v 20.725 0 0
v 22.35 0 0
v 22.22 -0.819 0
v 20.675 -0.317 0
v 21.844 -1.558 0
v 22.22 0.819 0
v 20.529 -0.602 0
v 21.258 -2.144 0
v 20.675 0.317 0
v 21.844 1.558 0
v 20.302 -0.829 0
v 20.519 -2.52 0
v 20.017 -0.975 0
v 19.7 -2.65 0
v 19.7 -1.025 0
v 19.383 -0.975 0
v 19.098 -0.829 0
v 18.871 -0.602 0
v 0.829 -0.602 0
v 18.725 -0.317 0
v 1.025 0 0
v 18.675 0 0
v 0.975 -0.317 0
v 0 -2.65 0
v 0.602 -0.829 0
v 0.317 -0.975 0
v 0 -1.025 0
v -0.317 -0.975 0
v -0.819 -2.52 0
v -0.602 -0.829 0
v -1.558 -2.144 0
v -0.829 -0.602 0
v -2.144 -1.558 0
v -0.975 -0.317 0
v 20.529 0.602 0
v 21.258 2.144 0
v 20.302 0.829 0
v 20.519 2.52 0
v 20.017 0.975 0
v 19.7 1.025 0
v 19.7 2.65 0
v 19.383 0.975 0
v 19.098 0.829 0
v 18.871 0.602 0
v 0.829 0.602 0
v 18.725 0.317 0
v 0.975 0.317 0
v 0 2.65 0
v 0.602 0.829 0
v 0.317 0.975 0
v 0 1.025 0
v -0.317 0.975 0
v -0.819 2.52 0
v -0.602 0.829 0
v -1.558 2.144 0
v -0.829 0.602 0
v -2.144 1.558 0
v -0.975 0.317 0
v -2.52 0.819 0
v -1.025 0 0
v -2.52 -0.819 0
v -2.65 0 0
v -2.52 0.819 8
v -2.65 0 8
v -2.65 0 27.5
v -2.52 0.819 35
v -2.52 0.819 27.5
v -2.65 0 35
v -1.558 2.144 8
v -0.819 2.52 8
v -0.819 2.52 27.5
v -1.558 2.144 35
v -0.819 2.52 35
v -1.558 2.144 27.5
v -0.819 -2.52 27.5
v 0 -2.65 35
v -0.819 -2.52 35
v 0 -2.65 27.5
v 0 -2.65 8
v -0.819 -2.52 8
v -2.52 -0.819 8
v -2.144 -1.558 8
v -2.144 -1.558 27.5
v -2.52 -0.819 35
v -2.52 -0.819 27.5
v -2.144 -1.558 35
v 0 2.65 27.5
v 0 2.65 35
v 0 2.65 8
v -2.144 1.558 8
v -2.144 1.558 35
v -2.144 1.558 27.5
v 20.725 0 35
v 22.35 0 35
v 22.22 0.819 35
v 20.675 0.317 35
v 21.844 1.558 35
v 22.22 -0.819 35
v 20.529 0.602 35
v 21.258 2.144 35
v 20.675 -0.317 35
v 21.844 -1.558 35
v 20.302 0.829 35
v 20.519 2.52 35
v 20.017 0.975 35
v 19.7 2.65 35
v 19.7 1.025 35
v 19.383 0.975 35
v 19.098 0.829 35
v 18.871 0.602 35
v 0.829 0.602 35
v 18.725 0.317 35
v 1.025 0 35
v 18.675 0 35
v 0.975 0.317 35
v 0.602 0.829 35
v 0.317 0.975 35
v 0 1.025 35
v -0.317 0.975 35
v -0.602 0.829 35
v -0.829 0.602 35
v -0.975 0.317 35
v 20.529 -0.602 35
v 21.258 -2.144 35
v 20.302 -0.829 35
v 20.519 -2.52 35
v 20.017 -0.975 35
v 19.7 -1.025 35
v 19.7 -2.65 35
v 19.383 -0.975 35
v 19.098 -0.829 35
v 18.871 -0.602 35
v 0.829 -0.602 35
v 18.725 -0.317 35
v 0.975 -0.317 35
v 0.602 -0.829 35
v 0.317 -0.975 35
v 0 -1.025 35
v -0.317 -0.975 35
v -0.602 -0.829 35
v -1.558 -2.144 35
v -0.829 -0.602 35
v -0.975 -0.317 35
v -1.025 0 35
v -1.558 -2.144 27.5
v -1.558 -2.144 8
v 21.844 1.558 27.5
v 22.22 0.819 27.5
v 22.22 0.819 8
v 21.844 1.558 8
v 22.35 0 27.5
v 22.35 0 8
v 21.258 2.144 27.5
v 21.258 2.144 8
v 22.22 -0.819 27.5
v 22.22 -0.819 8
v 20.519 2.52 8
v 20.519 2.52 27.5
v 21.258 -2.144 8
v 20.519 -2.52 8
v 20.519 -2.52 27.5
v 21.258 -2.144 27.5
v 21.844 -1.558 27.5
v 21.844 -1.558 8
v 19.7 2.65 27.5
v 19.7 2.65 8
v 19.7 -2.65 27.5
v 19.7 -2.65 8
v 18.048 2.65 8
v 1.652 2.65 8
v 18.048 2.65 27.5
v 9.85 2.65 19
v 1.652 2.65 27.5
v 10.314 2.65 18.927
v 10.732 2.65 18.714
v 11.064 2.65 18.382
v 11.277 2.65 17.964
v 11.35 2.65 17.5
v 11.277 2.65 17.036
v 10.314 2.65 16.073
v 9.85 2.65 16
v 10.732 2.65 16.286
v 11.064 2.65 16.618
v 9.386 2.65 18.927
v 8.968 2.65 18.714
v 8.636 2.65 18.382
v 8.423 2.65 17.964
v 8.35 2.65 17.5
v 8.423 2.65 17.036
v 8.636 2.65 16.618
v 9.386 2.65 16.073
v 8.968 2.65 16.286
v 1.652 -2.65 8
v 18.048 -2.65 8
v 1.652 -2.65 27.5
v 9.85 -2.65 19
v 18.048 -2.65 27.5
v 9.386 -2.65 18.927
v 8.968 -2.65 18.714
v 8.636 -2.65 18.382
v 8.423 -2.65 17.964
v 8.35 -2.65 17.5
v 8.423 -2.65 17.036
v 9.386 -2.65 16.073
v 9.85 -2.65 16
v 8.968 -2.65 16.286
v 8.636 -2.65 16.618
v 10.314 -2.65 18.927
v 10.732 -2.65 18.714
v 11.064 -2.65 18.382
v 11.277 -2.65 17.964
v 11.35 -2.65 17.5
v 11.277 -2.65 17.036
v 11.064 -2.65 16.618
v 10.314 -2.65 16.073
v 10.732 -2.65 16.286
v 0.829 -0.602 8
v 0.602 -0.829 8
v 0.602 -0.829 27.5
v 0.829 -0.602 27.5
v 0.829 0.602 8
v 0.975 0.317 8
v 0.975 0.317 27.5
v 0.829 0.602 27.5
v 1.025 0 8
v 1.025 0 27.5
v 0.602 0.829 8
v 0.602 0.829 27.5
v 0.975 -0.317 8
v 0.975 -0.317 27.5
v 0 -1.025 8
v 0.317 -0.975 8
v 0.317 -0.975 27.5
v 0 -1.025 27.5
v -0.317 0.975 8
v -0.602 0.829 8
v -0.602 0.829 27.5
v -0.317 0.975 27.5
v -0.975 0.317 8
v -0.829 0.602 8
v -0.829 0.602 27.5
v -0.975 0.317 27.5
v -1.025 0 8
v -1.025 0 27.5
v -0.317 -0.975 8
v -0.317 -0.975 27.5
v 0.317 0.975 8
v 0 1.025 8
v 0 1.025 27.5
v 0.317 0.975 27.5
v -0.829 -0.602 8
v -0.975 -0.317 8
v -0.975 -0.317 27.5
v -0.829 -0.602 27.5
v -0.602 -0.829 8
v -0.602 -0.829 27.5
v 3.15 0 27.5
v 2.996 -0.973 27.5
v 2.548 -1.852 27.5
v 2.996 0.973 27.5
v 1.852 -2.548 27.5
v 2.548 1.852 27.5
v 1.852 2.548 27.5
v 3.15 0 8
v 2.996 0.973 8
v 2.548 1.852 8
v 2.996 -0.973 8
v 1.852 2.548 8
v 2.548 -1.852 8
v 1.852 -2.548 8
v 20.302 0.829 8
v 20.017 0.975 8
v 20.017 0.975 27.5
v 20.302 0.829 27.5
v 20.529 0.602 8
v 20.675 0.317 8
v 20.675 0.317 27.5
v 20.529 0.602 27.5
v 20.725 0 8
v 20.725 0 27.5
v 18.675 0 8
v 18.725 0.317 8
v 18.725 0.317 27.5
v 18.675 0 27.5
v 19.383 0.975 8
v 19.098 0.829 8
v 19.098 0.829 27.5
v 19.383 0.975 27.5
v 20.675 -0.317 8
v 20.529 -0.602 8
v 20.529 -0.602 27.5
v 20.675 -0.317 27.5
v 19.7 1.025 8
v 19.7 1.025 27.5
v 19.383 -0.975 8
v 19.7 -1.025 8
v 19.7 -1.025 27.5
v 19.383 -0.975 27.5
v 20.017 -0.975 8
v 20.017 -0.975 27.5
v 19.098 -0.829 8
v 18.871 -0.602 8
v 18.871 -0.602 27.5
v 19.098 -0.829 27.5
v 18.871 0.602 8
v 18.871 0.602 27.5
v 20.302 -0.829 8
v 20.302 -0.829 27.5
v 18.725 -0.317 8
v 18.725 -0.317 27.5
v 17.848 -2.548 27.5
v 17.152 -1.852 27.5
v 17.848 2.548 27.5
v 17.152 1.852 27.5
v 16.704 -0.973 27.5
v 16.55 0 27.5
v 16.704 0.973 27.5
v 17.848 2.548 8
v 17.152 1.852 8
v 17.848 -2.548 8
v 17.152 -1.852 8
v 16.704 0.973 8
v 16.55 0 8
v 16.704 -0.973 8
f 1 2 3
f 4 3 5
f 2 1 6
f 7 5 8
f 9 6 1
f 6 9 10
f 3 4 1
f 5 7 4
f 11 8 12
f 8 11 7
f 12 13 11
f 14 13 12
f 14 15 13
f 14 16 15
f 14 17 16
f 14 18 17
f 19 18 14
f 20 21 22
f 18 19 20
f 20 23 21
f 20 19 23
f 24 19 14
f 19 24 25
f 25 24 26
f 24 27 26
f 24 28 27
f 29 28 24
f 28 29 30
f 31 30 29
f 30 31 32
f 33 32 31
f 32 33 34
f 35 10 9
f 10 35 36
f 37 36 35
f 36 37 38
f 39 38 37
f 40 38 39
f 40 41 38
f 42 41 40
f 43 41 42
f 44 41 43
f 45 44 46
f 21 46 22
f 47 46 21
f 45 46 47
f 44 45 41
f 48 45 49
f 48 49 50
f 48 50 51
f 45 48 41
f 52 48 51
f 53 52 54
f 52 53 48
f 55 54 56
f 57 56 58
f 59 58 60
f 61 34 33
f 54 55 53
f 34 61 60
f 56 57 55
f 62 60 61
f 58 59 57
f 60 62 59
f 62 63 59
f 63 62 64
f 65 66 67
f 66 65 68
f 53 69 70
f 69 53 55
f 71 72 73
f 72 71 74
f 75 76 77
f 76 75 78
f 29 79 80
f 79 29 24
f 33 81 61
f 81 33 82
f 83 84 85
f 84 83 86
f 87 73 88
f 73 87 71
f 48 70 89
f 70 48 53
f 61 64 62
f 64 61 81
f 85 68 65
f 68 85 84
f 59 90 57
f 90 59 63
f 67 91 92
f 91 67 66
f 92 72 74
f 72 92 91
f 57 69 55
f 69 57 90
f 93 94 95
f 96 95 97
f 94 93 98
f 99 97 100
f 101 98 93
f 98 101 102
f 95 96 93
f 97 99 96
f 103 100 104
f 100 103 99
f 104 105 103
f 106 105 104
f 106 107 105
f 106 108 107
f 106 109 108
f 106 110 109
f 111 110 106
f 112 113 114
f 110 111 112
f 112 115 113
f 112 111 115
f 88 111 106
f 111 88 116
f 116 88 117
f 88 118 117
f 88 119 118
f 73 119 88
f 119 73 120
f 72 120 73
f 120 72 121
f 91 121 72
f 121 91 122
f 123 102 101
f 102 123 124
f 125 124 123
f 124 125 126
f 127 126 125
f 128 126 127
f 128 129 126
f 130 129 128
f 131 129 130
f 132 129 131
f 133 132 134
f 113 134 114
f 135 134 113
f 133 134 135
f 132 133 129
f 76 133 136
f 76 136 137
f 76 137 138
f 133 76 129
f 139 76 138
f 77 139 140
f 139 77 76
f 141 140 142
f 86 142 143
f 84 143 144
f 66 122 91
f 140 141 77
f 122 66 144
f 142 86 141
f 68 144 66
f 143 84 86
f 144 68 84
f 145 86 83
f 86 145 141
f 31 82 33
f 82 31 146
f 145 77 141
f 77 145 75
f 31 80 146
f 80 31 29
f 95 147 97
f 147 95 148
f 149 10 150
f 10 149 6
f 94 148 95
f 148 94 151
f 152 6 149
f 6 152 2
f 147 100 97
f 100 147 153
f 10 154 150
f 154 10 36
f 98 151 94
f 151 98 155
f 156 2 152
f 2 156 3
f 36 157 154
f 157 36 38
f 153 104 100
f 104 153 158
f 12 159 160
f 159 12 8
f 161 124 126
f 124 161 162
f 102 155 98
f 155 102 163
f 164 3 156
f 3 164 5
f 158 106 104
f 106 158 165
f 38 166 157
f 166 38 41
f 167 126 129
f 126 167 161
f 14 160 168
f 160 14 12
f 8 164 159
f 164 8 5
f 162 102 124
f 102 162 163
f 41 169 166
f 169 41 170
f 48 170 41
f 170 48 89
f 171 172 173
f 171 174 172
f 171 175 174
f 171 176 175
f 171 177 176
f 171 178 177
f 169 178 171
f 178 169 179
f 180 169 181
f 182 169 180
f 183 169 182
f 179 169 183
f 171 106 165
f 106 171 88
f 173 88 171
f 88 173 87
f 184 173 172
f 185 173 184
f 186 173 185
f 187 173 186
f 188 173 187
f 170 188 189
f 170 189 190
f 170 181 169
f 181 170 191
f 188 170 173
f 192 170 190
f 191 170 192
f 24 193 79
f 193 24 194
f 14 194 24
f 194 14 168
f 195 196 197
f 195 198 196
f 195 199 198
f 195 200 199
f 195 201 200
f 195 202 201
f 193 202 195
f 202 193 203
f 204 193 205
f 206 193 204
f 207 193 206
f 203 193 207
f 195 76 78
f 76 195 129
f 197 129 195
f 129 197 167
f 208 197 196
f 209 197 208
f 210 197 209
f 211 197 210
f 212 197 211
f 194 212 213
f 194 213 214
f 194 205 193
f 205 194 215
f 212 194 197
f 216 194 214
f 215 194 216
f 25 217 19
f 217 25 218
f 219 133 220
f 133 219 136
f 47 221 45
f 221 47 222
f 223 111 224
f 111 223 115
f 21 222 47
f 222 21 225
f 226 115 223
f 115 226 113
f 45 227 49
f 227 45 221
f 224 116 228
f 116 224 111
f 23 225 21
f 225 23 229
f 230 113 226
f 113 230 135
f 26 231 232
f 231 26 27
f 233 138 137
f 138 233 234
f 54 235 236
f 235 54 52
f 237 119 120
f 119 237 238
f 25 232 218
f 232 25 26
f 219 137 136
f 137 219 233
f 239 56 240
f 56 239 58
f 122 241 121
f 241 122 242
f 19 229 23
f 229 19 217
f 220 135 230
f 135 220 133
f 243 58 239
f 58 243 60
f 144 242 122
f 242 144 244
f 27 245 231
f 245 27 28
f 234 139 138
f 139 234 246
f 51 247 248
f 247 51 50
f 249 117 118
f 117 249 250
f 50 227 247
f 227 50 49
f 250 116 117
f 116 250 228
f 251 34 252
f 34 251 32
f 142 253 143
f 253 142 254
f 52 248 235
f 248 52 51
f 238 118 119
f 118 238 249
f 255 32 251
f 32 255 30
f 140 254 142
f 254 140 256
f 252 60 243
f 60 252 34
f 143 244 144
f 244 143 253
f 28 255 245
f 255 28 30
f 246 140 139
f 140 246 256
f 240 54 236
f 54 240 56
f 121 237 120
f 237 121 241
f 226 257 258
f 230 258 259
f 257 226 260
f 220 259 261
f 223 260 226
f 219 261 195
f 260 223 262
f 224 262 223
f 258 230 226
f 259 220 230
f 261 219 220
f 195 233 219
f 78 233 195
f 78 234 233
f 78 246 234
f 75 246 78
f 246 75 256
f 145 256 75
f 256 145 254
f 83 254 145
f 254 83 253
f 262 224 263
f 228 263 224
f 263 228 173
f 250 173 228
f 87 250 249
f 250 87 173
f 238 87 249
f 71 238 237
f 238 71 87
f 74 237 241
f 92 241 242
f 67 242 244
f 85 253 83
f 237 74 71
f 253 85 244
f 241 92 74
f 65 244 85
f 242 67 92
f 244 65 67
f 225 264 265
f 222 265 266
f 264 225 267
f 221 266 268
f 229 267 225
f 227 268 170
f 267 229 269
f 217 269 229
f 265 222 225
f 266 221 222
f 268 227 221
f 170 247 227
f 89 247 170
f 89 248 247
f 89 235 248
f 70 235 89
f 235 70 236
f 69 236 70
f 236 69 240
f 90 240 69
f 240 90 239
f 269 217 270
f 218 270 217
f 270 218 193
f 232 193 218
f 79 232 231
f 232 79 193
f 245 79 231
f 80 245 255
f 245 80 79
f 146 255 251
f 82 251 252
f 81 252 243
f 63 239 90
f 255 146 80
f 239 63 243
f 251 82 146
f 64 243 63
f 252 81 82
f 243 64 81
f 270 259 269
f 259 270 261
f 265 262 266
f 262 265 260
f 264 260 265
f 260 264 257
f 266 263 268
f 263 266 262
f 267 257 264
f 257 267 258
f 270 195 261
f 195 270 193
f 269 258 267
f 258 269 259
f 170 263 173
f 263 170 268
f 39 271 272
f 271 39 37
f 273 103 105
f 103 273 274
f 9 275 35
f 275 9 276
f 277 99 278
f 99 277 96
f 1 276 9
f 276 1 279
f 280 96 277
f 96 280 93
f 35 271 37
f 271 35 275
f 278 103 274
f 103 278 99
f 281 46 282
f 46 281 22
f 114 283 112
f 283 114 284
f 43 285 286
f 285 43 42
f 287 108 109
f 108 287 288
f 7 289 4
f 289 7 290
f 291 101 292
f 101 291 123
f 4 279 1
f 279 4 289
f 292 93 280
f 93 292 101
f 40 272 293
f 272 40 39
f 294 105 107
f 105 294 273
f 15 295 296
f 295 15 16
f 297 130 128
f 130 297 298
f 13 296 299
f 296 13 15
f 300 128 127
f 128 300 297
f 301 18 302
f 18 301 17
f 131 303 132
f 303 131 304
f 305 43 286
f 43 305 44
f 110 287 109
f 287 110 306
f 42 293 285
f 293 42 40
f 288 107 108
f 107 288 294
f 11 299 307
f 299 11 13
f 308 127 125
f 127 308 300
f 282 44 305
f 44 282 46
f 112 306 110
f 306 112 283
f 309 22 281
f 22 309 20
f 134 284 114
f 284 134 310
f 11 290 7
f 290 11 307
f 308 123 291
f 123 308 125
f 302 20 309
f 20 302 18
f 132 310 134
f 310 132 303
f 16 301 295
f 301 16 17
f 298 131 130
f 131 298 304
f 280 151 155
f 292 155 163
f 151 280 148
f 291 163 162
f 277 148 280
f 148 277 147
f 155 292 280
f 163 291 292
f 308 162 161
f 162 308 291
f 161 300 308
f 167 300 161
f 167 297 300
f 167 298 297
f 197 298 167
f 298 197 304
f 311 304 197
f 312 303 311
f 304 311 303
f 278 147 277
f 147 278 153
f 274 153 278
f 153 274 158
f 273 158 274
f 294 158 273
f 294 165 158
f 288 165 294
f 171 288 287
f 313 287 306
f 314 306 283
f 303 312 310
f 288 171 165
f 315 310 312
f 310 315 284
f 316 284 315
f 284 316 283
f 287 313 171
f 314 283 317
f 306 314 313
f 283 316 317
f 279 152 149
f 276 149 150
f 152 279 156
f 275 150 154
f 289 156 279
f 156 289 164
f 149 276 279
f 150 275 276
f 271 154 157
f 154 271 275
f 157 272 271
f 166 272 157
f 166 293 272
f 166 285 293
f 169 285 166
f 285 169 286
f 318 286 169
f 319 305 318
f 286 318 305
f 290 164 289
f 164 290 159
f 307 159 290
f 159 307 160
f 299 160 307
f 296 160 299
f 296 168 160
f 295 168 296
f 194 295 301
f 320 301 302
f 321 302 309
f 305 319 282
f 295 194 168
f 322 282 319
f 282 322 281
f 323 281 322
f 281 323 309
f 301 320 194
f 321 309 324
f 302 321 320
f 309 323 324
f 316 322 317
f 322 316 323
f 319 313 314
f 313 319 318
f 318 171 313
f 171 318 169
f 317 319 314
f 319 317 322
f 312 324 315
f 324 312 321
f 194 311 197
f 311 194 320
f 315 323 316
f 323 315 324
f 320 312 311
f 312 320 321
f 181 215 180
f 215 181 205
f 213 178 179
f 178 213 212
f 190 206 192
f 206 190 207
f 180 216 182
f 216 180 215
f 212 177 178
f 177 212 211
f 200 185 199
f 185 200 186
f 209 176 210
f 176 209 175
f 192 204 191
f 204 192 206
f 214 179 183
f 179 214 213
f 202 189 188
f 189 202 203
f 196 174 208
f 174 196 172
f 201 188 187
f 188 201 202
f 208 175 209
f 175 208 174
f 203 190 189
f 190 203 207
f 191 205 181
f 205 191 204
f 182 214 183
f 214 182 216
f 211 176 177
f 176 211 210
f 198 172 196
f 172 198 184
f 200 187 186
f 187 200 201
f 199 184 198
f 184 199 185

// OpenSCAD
// file: end.scad
include <belt_configuration.scad>

module end()
{
  difference()
  {
    union()
    {
      cylinder(r=belt_thickness / 2, h=belt_height);

      translate([h_width - belt_thickness,0,0])
        cylinder(r=belt_thickness / 2, h=belt_height);

      translate([0, -belt_thickness / 2, 0])
        cube([h_width-belt_thickness, belt_thickness, belt_height]);
    }

    translate([0,0,-mo])
      cylinder(r=pin_diameter / 2, h=belt_height + 2 * mo);
  
    translate([-belt_thickness / 2, -belt_thickness / 2 - mo, belt_height/2 - link_depth_height/2+link_tolerance / 2])
      cube([link_depth-pin_diameter/4, belt_thickness + 2* mo, link_depth_height-link_tolerance/2]);

    translate([0,0, belt_height/2 - link_depth_height/2+link_tolerance / 2])
      cylinder(r=(belt_thickness+link_tolerance) / 2, h=link_depth_height-link_tolerance/2);
  }
}

end();
// file: h.scad
include <belt_configuration.scad>

use <end.scad>

module h()
{
  difference()
  {
    end();

    translate([h_width - belt_thickness,0,-mo])
      cylinder(r=pin_diameter / 2, h=belt_height + 2 * mo);

    translate([h_width - link_depth +pin_diameter/4- belt_thickness / 2,-belt_thickness / 2 - mo, belt_height/2 - link_depth_height/2+link_tolerance / 2])
      cube([link_depth-pin_diameter/4, belt_thickness + 2* mo, link_depth_height-link_tolerance/2]); 

    translate([h_width - belt_thickness,0, belt_height/2 - link_depth_height/2+link_tolerance / 2])
      cylinder(r=(belt_thickness+link_tolerance) / 2, h=link_depth_height-link_tolerance/2);
  }
}

h();
// file: belt_configuration.scad
belt_thickness = 5.3;
belt_height = 35;
buckle_thickness = 2;
buckle_length = 30;

$fn = 20;

cross_width = 25;
h_width = 25;
peak_width = 10;

link_height = 20;

pin_diameter = 2.05;

pin_tolerance = 0.2;

hole_diameter = 3;

mo = 0.01;


link_tolerance = 1;
link_depth = pin_diameter + 2*link_tolerance;
link_depth_height = 20;

tolerance = 1;
// main file
include <belt_configuration.scad>

use <h.scad>

module h_hole()
{
	difference()
   {
		h();
      translate([h_width/2-belt_thickness / 2,-belt_thickness/2-mo,belt_height/2])
		rotate([-90,0,0])
        cylinder(r=hole_diameter / 2, h=belt_thickness+2*mo);
   }
}

module peak()
{
  difference()
  {
    union()
    {
      cylinder(r=belt_thickness / 2, h=belt_height);

      translate([peak_width - belt_thickness,0,0])
        cylinder(r=belt_thickness / 2, h=belt_height);

      translate([0, -belt_thickness / 2, 0])
        cube([peak_width-belt_thickness, belt_thickness, belt_height]);

      translate([peak_width/2,0,belt_height/2])
      rotate([0,90,0])
      intersection()
      {
        intersection_for(n = [1 : 6])
        {
          rotate([0, 0, n * 60])
          {
              translate([10,0,0])
              sphere(r=belt_height);
          }
        }
        translate([-belt_height/2,-belt_thickness/2,0])
        cube([belt_height, belt_thickness, 50]);
      }
    }

    translate([0,0,-mo])
      cylinder(r=pin_diameter / 2, h=belt_height + 2 * mo);
  
    translate([-belt_thickness / 2, -belt_thickness / 2 - mo, belt_height/2 - link_depth_height/2+link_tolerance / 2])
      cube([link_depth-pin_diameter/4, belt_thickness + 2* mo, link_depth_height-link_tolerance/2]);

    translate([0,0, belt_height/2 - link_depth_height/2+link_tolerance / 2])
      cylinder(r=(belt_thickness+link_tolerance) / 2, h=link_depth_height-link_tolerance/2);
  }
}

h_hole();
